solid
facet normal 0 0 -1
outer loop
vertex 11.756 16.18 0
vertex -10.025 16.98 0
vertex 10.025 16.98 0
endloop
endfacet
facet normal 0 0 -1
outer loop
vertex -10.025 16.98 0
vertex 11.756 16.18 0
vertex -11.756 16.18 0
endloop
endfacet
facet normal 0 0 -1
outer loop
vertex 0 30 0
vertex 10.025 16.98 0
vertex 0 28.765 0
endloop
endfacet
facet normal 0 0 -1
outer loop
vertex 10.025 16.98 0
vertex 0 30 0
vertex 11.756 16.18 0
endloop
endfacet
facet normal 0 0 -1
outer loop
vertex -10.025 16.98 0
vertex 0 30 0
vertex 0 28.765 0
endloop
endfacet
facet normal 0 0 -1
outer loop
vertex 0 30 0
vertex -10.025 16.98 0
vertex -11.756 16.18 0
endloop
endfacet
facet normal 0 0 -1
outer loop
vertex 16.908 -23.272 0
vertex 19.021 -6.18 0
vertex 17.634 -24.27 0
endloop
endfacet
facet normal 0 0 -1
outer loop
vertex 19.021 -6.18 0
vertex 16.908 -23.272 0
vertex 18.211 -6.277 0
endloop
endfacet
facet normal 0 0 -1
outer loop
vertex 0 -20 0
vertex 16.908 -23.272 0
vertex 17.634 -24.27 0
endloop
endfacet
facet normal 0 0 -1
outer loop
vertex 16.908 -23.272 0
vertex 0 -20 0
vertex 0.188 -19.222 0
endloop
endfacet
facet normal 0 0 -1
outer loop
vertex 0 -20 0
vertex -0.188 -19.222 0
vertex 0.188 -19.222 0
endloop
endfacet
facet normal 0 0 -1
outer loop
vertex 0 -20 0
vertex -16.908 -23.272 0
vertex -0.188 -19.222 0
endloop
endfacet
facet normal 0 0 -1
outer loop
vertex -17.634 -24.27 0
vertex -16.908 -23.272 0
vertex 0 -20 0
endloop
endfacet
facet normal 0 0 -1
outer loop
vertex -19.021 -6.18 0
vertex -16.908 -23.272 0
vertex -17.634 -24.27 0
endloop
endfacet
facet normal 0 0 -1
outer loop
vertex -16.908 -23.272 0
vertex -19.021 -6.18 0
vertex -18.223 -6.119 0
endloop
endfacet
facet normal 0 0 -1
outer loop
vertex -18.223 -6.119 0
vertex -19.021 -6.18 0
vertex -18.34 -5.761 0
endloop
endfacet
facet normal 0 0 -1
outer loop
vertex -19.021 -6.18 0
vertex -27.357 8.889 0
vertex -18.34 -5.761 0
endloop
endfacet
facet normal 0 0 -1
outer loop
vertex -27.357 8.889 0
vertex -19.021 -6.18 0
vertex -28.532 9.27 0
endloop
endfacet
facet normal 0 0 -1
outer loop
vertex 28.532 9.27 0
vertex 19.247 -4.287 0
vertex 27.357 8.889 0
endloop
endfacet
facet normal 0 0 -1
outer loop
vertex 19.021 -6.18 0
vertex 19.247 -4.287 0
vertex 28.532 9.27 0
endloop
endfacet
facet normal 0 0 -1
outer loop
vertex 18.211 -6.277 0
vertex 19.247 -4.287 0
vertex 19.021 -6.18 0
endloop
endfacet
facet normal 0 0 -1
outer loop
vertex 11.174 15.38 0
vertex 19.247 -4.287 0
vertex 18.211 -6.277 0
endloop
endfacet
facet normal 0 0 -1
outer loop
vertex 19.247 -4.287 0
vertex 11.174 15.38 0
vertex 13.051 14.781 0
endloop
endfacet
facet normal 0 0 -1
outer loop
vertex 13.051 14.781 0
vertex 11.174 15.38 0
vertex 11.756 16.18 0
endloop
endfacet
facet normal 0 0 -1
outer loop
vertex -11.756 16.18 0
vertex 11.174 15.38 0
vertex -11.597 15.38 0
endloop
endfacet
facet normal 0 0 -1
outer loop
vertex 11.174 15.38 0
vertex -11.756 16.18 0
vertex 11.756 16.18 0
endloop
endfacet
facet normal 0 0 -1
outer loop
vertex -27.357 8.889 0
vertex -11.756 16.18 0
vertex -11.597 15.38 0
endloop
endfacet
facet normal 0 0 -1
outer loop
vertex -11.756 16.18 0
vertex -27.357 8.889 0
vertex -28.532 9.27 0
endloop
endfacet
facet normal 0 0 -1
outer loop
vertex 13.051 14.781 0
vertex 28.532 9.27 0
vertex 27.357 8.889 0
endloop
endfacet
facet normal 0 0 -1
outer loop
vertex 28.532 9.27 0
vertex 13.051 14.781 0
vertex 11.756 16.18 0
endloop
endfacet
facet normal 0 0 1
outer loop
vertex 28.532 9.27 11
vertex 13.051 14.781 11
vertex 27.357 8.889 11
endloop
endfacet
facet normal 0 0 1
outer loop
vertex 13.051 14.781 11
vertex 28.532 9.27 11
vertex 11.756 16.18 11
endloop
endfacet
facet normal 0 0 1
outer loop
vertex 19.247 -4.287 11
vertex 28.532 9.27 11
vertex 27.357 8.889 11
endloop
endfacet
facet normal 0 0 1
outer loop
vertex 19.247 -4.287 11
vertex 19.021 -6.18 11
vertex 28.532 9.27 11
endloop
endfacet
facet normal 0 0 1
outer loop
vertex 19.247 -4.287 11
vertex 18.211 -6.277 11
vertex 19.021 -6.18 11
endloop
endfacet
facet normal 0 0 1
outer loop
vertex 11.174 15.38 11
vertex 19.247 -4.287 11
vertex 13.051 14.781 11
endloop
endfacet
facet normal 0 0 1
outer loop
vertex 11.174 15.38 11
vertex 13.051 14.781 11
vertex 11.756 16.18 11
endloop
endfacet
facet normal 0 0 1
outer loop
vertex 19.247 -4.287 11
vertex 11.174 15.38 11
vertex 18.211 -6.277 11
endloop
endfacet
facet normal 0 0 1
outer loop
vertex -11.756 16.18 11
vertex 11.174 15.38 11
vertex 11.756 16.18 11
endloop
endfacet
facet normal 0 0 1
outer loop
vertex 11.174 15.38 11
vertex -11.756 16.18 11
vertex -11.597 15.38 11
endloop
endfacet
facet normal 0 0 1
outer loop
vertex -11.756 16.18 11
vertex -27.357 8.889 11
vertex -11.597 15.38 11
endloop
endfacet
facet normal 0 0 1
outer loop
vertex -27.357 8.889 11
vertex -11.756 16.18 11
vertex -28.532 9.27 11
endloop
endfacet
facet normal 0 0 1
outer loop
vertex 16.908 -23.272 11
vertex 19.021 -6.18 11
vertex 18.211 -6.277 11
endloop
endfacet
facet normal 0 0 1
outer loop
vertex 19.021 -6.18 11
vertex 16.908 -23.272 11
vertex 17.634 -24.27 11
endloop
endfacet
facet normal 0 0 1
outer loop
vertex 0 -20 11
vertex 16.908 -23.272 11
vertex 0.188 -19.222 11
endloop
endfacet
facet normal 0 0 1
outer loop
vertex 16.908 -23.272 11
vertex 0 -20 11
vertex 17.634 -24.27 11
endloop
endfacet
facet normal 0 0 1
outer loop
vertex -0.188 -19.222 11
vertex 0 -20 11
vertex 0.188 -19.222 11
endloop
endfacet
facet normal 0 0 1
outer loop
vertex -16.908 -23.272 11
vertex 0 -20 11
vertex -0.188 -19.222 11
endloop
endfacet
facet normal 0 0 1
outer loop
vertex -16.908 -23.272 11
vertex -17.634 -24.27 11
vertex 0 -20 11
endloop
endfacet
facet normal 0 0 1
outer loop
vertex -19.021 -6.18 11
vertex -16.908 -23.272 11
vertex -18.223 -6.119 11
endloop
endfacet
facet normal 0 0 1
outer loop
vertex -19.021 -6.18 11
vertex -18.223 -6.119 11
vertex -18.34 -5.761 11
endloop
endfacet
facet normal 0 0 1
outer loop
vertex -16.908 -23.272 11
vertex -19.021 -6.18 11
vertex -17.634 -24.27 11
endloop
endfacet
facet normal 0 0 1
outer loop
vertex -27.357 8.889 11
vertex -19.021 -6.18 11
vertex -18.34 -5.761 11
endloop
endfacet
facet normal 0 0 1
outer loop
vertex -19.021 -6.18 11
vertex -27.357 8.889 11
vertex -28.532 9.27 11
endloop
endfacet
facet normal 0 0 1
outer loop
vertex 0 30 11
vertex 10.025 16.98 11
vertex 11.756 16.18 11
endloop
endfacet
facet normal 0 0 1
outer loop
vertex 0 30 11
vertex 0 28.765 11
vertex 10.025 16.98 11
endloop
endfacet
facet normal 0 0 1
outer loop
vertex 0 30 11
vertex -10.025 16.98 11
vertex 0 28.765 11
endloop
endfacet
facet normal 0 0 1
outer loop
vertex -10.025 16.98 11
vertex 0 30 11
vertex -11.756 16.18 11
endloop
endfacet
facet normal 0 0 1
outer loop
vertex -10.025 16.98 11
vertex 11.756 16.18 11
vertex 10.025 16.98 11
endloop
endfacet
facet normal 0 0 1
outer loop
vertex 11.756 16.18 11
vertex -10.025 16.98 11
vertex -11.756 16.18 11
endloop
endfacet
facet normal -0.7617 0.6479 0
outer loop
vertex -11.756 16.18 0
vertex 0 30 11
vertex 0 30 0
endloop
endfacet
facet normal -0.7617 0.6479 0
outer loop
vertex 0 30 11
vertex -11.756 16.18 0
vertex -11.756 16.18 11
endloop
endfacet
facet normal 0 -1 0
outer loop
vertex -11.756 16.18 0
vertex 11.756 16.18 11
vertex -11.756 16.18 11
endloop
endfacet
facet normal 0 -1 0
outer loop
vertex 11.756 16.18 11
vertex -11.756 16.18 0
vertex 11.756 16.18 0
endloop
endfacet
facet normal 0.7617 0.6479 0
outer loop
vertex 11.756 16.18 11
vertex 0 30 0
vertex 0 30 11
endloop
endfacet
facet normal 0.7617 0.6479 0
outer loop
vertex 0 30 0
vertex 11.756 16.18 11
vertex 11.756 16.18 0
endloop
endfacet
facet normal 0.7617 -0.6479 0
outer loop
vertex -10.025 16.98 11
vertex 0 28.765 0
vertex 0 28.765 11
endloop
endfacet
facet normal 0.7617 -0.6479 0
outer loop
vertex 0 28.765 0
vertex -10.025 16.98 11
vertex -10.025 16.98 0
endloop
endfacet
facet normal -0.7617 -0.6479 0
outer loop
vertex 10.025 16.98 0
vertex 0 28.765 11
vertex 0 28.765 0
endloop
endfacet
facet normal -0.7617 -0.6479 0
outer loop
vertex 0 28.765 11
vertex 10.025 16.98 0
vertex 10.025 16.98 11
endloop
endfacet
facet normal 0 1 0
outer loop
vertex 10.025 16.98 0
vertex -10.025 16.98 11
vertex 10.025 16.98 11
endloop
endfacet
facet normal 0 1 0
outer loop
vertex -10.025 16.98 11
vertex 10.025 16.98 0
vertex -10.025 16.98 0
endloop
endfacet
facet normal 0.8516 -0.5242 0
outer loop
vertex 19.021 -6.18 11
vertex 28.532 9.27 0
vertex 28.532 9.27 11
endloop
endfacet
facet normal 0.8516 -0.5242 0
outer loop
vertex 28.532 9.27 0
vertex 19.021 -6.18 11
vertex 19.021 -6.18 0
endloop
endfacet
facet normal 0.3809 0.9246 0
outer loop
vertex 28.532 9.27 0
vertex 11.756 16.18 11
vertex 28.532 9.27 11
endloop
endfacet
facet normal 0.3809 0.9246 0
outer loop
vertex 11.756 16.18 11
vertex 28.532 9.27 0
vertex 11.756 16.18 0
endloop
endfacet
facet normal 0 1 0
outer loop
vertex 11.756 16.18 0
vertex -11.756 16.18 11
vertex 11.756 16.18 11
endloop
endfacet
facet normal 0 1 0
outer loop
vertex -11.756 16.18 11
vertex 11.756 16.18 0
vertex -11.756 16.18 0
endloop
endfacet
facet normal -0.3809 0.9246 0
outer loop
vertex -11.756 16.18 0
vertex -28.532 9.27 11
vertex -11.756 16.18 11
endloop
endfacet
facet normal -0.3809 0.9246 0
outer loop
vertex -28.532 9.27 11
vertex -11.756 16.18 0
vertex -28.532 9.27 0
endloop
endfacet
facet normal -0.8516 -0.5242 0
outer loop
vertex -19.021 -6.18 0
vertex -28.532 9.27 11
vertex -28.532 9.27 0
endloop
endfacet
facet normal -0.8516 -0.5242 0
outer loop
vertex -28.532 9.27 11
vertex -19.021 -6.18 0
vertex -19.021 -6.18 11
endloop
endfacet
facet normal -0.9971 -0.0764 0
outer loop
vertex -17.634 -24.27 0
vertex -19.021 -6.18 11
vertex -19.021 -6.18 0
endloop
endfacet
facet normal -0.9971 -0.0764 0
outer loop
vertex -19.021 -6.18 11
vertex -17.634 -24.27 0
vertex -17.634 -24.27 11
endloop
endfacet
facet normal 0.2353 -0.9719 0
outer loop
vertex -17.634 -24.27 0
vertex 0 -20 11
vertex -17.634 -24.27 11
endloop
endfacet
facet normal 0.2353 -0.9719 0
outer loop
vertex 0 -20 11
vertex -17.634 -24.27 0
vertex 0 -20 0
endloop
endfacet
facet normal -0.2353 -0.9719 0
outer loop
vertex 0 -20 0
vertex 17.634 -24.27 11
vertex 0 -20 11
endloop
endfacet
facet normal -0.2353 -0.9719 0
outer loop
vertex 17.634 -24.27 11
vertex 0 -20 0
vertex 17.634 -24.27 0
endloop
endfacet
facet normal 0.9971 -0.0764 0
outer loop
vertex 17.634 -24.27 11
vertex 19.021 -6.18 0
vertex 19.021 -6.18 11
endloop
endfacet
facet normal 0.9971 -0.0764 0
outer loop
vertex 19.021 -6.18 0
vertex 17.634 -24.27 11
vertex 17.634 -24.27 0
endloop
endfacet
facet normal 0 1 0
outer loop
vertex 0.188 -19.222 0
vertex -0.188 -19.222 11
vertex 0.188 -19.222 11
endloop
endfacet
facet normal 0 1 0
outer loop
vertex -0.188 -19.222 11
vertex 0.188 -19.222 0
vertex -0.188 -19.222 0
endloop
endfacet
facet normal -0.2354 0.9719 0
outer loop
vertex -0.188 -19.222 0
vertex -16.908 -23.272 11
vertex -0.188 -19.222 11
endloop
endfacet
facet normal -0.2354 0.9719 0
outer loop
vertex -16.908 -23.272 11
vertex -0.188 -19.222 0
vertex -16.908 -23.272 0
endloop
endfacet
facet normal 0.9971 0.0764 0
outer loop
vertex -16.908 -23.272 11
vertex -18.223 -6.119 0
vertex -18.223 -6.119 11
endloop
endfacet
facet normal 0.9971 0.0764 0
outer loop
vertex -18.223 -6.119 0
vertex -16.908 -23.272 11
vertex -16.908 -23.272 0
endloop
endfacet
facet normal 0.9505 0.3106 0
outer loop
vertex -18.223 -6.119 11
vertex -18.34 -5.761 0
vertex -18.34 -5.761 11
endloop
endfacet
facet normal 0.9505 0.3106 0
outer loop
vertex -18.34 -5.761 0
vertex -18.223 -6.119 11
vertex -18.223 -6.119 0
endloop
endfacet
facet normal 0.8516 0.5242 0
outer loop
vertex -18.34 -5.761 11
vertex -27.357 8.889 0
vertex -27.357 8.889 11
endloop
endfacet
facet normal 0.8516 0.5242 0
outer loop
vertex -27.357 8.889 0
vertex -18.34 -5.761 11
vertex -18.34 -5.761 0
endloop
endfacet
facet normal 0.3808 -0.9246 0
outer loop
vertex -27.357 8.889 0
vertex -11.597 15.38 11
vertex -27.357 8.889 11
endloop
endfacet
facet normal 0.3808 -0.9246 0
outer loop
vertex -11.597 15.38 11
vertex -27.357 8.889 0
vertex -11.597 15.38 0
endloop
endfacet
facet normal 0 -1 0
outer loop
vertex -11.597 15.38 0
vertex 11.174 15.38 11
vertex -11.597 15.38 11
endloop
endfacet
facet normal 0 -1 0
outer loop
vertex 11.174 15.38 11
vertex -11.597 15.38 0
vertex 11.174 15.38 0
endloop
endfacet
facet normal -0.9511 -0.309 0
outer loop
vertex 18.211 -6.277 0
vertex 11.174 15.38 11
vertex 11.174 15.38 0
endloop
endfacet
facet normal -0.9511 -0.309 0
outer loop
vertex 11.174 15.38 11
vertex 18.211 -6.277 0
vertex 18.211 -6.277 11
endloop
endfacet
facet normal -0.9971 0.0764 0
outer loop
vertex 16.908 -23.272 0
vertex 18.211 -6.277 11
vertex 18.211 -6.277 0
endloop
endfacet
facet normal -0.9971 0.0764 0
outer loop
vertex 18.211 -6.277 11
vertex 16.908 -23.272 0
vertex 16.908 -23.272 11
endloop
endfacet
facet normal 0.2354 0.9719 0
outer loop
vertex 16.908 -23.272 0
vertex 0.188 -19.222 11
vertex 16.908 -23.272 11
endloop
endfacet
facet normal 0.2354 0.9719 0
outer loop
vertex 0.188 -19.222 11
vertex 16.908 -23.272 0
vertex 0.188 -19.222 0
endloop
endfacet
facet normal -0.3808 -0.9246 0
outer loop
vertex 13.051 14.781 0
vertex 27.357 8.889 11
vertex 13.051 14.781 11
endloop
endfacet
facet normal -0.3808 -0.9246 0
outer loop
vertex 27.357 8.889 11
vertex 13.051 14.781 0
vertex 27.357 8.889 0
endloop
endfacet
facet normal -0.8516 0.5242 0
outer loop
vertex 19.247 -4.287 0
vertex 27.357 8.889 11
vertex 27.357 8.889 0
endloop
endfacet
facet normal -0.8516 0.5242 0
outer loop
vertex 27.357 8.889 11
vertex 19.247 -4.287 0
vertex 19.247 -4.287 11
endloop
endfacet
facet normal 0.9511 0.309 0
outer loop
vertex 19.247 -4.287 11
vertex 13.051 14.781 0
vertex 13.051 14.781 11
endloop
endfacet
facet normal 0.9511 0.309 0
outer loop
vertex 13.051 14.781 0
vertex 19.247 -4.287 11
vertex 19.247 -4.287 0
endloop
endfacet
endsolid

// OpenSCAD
//CUSTOMIZER VARIABLES

//  Number of sides
n = 5; //  [3:30]
//  Radius of the box in mm
r = 30;
//  Length of each arm in mm
l = 10;
//  Height of the box
h = 15;
//  Wall thickness in mm
w = 0.8;
//  Thickness of bottom wall in mm
b_l = 1;
//  Roundness factor
r_f = 0; //[0:10]
//  Generate Box (0) or Lid (1)
Select = 0; //[0:1]

//CUSTOMIZER VARIABLES END

module poly(n_sides, r, l, rnd = 0) {
    r = r - l;
    theta = 360/n_sides;
    //echo(theta);
    pts_1 = [for (i = [0:theta:360]) [r*sin(i),r*cos(i)]];
    //echo(pts_1);
    
    h = r*cos(theta/2);
    s = r*sin(theta/2);
    //echo(h);
    
    pts_2 = [[-s,0],[0,l+(r-h)],[s,0]];
    //echo(pts_2);
    
    if (rnd == 0) {
        union() {
            for (i = [0:360/n_sides:360]) 
                rotate(i)
                union() {
                    rotate([0,0,-theta/2])
                    polygon(pts_1);
                    
                    translate([0,h,0])
                    polygon(pts_2);
                }
        }
    }
    else {
        minkowski(){
            union() {
                for (i = [0:360/n_sides:360]) 
                    rotate(i)
                    union() {
                        rotate([0,0,-theta/2])
                        polygon(pts_1);
                        
                        translate([0,h,0])
                        polygon(pts_2);
                    }
            }
            circle(rnd, $fn = 32);
        }
    }
}

if (Select == 0) {
    // Build the box
    //translate([-1.5*r,0,0])
    union() {
        linear_extrude((8*h/10) - b_l)
        difference() {
            poly(n, r, l, r_f);
            offset(-w)
            poly(n, r, l, r_f);
        }
        linear_extrude(b_l)
        poly(n, r, l, r_f);
    }
}
else {
    // Build the lid
    //translate([1.5*r,0,0])
    union() {
        linear_extrude(2*h/10)
        difference() {
            offset(-w)
            poly(n, r, l, r_f);
            offset(-2*w)
            poly(n, r, l, r_f);
        }
        linear_extrude(h/10)
        poly(n, r, l, r_f);
    }
}
